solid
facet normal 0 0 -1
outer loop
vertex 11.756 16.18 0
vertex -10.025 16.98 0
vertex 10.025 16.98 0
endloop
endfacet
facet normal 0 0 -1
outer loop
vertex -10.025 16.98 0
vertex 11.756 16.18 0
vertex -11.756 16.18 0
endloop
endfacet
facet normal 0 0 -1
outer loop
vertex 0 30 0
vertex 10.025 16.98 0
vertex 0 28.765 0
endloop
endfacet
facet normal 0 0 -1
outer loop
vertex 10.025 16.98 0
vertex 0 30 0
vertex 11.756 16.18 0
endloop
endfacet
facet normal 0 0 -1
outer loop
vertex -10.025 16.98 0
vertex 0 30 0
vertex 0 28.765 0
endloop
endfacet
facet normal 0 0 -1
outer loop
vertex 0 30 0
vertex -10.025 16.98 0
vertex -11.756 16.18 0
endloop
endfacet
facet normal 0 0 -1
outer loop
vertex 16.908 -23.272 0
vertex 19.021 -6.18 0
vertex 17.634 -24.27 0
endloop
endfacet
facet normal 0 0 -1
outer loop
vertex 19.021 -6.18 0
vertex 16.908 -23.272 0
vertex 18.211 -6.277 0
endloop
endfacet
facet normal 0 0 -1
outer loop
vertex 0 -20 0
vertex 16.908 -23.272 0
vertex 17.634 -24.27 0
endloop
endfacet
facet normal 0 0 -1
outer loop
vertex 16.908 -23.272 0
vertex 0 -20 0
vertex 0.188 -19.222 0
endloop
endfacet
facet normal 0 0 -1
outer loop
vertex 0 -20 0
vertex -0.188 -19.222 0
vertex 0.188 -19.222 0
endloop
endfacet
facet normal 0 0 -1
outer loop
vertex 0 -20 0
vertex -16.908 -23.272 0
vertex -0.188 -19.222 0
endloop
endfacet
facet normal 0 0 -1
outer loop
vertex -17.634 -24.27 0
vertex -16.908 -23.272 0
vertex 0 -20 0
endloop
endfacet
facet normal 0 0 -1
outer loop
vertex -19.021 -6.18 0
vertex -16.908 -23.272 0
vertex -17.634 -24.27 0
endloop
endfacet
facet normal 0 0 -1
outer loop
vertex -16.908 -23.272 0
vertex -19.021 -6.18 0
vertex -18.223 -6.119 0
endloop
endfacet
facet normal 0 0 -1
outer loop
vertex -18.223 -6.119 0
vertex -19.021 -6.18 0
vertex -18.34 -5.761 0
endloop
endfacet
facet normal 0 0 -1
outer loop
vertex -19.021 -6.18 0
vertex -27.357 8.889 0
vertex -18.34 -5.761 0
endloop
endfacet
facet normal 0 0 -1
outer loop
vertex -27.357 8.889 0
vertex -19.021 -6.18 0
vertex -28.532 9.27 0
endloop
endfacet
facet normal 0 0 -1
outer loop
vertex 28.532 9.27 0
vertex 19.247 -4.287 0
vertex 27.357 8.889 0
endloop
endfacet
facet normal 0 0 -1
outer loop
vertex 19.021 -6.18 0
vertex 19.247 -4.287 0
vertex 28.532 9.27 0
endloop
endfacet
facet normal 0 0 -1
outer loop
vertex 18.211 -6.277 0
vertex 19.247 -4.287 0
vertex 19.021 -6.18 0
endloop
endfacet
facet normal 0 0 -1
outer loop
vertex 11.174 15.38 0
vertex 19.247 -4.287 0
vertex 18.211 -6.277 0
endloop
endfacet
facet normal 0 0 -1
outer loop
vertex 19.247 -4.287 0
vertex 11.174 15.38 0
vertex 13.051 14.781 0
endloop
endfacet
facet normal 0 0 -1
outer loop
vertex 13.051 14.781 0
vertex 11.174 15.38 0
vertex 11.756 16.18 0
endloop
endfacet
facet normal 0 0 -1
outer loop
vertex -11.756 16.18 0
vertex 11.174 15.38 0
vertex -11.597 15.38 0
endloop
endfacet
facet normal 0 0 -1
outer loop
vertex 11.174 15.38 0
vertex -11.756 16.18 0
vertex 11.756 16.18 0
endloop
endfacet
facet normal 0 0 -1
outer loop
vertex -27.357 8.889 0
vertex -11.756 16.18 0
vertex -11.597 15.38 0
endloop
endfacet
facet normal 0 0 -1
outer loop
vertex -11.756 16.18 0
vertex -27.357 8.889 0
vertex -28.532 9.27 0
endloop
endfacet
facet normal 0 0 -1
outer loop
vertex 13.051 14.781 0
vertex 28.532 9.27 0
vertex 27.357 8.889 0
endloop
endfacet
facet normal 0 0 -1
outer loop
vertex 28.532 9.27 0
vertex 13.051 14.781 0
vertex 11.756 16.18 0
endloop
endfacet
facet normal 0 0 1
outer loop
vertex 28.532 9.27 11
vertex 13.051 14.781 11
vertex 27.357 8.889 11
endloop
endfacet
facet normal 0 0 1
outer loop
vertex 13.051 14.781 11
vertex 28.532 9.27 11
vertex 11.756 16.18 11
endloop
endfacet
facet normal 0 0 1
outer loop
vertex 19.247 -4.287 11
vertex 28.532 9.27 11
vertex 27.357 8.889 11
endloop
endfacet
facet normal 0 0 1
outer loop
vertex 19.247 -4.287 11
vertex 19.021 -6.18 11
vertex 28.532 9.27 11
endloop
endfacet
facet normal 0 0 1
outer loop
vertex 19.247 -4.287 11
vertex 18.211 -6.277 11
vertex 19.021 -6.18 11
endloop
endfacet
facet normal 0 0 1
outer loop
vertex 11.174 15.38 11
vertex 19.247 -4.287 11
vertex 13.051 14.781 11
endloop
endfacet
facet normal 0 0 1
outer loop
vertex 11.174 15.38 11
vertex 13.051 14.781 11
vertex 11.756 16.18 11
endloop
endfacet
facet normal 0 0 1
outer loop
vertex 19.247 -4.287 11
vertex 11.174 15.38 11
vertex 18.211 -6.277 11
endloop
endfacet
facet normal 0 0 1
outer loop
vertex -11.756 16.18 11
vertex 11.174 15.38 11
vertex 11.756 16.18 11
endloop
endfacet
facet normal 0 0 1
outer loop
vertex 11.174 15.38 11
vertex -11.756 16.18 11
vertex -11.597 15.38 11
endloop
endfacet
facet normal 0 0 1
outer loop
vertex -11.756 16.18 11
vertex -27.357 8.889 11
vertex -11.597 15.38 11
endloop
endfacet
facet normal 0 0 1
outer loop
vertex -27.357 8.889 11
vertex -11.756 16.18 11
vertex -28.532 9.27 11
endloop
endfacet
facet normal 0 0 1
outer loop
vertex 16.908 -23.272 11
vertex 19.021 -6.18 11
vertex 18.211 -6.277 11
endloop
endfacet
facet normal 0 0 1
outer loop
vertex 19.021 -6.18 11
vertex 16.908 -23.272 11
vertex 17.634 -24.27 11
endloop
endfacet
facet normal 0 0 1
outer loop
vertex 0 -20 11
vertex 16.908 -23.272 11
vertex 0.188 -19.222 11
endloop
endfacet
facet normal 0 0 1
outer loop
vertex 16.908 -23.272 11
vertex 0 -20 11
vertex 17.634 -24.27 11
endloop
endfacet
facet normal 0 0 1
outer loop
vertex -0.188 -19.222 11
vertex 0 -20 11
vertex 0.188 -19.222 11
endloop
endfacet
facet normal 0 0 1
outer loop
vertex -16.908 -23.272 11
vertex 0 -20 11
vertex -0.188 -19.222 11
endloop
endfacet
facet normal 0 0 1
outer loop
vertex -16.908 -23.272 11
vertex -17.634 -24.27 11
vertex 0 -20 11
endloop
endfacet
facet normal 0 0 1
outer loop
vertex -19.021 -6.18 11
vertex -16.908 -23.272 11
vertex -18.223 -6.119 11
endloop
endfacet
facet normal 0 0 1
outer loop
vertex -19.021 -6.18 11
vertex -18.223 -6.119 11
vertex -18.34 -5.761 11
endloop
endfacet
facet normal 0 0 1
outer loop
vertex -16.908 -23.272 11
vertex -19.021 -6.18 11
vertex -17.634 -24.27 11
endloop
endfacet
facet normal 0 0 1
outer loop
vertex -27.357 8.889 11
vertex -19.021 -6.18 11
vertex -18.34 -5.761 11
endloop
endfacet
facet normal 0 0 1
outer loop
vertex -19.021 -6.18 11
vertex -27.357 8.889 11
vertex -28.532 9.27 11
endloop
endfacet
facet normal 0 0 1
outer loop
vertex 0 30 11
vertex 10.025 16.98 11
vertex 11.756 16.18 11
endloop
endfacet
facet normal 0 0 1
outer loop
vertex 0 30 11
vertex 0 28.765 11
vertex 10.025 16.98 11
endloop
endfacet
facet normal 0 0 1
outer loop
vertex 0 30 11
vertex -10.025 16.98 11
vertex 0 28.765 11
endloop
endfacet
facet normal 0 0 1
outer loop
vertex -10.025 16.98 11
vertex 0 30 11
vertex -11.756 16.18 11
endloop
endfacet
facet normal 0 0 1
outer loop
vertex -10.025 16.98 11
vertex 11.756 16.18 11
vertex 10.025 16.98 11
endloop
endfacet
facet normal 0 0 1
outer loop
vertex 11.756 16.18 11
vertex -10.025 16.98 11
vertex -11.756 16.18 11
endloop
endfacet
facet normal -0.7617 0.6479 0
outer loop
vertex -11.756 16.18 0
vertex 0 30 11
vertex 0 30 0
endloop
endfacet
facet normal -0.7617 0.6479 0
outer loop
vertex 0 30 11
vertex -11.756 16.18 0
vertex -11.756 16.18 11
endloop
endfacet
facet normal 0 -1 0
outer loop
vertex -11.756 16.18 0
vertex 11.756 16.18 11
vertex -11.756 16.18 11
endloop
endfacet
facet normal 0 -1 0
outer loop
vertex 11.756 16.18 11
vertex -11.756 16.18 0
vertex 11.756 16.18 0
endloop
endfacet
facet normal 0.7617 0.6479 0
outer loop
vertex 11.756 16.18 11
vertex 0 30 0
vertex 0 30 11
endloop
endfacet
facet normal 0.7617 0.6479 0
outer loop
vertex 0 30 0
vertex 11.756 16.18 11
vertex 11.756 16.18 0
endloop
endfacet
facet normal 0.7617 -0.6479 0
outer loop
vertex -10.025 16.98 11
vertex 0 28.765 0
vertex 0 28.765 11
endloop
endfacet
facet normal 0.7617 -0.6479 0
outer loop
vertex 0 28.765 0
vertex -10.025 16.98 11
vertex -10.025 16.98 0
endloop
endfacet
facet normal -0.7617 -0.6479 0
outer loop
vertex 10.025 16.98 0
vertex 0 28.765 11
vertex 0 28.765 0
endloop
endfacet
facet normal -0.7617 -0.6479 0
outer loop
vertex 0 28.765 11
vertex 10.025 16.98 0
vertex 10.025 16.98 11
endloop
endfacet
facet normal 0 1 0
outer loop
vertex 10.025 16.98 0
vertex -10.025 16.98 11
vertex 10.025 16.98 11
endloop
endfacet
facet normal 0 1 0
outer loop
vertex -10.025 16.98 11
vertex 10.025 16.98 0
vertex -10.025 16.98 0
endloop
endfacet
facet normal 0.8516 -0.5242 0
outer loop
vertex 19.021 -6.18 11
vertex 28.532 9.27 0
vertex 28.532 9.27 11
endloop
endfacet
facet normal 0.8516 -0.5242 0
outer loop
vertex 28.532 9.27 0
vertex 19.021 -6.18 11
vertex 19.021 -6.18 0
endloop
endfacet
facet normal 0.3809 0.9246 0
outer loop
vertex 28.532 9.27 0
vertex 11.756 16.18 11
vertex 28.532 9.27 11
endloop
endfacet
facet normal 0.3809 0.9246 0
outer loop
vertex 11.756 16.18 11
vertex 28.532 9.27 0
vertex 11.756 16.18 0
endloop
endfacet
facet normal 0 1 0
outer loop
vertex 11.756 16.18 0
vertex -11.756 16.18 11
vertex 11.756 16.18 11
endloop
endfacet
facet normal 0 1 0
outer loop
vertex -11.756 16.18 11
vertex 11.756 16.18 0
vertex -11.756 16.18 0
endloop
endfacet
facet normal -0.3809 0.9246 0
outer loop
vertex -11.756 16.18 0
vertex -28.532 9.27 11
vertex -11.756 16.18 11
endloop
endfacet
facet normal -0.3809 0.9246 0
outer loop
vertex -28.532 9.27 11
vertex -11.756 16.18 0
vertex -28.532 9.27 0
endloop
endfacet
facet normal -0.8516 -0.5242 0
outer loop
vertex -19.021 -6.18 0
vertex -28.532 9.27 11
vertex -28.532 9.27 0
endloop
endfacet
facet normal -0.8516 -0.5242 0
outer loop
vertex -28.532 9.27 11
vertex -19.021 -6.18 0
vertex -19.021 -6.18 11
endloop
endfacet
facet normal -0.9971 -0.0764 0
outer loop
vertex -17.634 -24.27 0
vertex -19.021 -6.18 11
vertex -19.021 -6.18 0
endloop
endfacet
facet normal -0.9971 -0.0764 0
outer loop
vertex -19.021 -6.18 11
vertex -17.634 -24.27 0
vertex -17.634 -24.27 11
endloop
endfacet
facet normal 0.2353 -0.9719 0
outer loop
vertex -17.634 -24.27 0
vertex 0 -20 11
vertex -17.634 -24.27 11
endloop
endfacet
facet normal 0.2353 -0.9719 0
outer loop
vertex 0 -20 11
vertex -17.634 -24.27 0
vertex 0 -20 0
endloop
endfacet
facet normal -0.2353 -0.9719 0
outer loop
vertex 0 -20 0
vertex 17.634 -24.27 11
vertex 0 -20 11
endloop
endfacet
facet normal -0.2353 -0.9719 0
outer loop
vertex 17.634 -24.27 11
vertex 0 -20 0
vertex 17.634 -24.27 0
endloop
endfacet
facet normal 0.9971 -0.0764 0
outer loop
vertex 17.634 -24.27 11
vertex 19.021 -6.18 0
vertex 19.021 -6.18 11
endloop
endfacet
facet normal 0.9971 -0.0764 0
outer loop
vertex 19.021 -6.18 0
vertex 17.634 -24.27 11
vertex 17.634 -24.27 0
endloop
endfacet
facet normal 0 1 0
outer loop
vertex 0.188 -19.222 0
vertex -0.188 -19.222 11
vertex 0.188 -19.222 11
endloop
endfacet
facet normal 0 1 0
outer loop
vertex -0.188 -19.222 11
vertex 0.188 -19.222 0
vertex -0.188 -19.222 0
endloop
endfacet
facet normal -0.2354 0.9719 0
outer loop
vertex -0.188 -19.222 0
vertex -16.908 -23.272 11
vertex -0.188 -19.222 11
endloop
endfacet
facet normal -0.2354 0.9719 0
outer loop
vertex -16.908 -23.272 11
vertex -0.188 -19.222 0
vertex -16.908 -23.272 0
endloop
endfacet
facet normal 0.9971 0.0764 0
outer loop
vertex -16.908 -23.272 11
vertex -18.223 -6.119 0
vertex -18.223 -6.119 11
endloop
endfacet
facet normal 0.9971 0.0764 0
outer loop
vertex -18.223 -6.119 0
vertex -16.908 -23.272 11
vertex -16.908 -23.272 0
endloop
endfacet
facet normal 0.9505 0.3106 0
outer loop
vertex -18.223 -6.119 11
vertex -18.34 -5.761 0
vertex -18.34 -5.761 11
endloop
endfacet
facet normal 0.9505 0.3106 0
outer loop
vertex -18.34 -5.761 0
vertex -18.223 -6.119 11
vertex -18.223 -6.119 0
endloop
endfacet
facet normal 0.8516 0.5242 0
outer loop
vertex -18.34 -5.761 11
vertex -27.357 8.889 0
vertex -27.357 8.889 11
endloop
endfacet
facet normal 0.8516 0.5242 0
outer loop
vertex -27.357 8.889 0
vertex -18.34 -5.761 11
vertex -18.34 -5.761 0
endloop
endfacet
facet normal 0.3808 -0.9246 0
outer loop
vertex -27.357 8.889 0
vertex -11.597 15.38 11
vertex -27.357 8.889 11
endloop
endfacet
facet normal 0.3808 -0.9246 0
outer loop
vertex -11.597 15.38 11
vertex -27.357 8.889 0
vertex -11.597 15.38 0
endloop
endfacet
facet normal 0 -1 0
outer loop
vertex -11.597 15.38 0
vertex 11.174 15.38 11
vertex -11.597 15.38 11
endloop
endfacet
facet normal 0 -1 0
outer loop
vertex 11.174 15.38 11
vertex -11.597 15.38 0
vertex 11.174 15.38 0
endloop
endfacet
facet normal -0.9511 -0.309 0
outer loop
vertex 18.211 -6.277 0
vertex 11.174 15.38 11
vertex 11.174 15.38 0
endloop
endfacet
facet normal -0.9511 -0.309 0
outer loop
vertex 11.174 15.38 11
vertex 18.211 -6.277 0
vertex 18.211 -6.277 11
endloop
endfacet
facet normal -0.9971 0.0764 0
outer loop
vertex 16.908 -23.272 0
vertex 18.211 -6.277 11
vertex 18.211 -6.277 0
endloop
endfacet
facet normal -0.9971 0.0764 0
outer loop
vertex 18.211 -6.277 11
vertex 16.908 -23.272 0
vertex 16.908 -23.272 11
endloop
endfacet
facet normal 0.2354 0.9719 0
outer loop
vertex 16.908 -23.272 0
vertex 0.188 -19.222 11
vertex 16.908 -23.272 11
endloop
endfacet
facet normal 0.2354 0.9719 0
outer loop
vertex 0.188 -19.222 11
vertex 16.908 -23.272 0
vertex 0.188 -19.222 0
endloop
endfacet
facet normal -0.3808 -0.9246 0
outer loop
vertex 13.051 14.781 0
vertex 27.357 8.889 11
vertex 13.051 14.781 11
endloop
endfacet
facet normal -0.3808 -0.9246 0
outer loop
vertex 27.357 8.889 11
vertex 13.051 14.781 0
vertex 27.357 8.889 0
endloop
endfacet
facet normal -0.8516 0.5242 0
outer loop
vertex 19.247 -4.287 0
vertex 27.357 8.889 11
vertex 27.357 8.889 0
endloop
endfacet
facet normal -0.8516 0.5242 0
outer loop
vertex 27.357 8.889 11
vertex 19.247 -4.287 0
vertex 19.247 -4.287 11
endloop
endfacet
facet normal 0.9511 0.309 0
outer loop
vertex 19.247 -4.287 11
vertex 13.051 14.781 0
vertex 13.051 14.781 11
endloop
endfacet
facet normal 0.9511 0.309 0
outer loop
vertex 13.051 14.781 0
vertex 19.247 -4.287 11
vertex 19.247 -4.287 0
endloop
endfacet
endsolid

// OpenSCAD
//CUSTOMIZER VARIABLES

//  Number of sides
n = 5; //  [3:30]
//  Radius of the box in mm
r = 30;
//  Length of each arm in mm
l = 10;
//  Height of the box
h = 15;
//  Wall thickness in mm
w = 0.8;
//  Thickness of bottom wall in mm
b_l = 1;
//  Roundness factor
r_f = 0; //[0:10]
//  Generate Box (0) or Lid (1)
Select = 0; //[0:1]

//CUSTOMIZER VARIABLES END

module poly(n_sides, r, l, rnd = 0) {
    r = r - l;
    theta = 360/n_sides;
    //echo(theta);
    pts_1 = [for (i = [0:theta:360]) [r*sin(i),r*cos(i)]];
    //echo(pts_1);
    
    h = r*cos(theta/2);
    s = r*sin(theta/2);
    //echo(h);
    
    pts_2 = [[-s,0],[0,l+(r-h)],[s,0]];
    //echo(pts_2);
    
    if (rnd == 0) {
        union() {
            for (i = [0:360/n_sides:360]) 
                rotate(i)
                union() {
                    rotate([0,0,-theta/2])
                    polygon(pts_1);
                    
                    translate([0,h,0])
                    polygon(pts_2);
                }
        }
    }
    else {
        minkowski(){
            union() {
                for (i = [0:360/n_sides:360]) 
                    rotate(i)
                    union() {
                        rotate([0,0,-theta/2])
                        polygon(pts_1);
                        
                        translate([0,h,0])
                        polygon(pts_2);
                    }
            }
            circle(rnd, $fn = 32);
        }
    }
}

if (Select == 0) {
    // Build the box
    //translate([-1.5*r,0,0])
    union() {
        linear_extrude((8*h/10) - b_l)
        difference() {
            poly(n, r, l, r_f);
            offset(-w)
            poly(n, r, l, r_f);
        }
        linear_extrude(b_l)
        poly(n, r, l, r_f);
    }
}
else {
    // Build the lid
    //translate([1.5*r,0,0])
    union() {
        linear_extrude(2*h/10)
        difference() {
            offset(-w)
            poly(n, r, l, r_f);
            offset(-2*w)
            poly(n, r, l, r_f);
        }
        linear_extrude(h/10)
        poly(n, r, l, r_f);
    }
}
